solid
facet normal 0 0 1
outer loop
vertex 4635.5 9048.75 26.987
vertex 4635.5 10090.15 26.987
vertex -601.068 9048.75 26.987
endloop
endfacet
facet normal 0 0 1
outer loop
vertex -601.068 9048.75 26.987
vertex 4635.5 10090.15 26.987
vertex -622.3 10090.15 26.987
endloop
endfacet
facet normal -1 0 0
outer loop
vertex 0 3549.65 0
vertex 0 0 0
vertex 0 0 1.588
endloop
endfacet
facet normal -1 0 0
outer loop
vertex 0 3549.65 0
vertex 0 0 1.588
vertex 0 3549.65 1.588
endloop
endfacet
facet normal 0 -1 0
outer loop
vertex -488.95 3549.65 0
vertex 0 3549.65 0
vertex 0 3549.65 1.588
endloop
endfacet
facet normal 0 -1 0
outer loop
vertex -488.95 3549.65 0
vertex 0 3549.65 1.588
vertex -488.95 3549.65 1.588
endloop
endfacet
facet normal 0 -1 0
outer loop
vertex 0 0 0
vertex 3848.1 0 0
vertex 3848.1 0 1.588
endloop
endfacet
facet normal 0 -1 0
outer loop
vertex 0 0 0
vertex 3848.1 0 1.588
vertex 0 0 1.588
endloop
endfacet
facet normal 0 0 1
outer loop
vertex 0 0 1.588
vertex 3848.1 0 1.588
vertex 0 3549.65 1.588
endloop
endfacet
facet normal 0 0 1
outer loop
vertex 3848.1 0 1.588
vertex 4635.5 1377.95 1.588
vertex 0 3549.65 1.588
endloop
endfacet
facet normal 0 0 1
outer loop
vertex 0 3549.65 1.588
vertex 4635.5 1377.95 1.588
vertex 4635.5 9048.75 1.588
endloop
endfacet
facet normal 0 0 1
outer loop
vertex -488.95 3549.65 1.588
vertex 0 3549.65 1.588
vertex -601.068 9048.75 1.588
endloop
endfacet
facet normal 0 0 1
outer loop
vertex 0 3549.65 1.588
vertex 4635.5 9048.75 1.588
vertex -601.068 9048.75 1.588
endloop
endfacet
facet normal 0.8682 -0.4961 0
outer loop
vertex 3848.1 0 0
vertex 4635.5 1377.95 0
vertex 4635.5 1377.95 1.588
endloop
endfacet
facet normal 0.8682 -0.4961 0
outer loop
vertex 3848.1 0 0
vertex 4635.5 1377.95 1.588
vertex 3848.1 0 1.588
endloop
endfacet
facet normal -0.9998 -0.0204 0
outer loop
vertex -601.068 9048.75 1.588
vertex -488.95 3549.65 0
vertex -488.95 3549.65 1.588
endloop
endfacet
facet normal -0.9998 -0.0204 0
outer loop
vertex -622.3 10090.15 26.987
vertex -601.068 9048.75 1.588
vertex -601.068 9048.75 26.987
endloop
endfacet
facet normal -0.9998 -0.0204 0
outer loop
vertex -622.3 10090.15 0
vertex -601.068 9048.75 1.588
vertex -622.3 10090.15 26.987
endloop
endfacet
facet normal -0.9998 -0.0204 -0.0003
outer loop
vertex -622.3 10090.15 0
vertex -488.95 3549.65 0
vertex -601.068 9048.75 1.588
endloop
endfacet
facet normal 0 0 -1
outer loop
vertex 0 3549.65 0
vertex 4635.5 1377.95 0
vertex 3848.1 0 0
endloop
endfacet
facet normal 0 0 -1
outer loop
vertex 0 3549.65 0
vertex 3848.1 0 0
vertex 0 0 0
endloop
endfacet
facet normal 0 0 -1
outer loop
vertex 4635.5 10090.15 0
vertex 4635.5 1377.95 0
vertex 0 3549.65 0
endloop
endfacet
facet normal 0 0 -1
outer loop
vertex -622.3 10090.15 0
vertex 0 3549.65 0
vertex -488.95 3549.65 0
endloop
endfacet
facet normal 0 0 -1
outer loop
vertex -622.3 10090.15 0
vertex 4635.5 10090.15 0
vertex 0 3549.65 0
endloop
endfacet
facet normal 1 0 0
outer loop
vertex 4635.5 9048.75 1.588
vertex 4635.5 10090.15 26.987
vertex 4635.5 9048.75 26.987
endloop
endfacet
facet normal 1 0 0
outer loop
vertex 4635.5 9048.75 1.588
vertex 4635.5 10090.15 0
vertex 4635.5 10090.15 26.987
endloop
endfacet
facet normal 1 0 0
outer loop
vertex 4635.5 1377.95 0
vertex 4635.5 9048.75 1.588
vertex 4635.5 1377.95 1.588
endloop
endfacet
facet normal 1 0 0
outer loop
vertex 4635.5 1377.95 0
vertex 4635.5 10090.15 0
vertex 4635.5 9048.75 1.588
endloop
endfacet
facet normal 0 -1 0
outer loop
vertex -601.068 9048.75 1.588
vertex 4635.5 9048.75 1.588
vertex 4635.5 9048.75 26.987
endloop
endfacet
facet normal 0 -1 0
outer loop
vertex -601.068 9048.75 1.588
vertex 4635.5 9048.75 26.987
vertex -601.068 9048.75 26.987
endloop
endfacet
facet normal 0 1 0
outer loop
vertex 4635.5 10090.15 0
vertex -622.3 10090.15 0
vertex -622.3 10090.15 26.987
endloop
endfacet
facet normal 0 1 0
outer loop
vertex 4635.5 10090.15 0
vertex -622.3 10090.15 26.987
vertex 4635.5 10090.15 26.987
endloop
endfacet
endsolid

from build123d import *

# Parameters (mm, degrees)
SALIENTE_EXTRUIR1_DEPTH = 1.5875
SALIENTE_EXTRUIR2_DEPTH = 25.4


with BuildPart() as part:
    # Croquis1 → Saliente-Extruir1 (new body)
    with BuildSketch(Plane.XY):
        Polygon((0, 0), (0, 3549.65), (-488.95, 3549.65), (-622.3, 10090.15), (4635.5, 10090.15), (4635.5, 1377.95), (3848.1, 0), align=None)
    extrude(amount=SALIENTE_EXTRUIR1_DEPTH)

    # Croquis2 → Saliente-Extruir2 (add)
    with BuildSketch(Plane.XY.offset(1.5875)):
        Polygon((4635.5, 9048.75), (-601.067572816, 9048.75), (-622.3, 10090.15), (4635.5, 10090.15), align=None)
    extrude(amount=SALIENTE_EXTRUIR2_DEPTH)


solid = part.part
